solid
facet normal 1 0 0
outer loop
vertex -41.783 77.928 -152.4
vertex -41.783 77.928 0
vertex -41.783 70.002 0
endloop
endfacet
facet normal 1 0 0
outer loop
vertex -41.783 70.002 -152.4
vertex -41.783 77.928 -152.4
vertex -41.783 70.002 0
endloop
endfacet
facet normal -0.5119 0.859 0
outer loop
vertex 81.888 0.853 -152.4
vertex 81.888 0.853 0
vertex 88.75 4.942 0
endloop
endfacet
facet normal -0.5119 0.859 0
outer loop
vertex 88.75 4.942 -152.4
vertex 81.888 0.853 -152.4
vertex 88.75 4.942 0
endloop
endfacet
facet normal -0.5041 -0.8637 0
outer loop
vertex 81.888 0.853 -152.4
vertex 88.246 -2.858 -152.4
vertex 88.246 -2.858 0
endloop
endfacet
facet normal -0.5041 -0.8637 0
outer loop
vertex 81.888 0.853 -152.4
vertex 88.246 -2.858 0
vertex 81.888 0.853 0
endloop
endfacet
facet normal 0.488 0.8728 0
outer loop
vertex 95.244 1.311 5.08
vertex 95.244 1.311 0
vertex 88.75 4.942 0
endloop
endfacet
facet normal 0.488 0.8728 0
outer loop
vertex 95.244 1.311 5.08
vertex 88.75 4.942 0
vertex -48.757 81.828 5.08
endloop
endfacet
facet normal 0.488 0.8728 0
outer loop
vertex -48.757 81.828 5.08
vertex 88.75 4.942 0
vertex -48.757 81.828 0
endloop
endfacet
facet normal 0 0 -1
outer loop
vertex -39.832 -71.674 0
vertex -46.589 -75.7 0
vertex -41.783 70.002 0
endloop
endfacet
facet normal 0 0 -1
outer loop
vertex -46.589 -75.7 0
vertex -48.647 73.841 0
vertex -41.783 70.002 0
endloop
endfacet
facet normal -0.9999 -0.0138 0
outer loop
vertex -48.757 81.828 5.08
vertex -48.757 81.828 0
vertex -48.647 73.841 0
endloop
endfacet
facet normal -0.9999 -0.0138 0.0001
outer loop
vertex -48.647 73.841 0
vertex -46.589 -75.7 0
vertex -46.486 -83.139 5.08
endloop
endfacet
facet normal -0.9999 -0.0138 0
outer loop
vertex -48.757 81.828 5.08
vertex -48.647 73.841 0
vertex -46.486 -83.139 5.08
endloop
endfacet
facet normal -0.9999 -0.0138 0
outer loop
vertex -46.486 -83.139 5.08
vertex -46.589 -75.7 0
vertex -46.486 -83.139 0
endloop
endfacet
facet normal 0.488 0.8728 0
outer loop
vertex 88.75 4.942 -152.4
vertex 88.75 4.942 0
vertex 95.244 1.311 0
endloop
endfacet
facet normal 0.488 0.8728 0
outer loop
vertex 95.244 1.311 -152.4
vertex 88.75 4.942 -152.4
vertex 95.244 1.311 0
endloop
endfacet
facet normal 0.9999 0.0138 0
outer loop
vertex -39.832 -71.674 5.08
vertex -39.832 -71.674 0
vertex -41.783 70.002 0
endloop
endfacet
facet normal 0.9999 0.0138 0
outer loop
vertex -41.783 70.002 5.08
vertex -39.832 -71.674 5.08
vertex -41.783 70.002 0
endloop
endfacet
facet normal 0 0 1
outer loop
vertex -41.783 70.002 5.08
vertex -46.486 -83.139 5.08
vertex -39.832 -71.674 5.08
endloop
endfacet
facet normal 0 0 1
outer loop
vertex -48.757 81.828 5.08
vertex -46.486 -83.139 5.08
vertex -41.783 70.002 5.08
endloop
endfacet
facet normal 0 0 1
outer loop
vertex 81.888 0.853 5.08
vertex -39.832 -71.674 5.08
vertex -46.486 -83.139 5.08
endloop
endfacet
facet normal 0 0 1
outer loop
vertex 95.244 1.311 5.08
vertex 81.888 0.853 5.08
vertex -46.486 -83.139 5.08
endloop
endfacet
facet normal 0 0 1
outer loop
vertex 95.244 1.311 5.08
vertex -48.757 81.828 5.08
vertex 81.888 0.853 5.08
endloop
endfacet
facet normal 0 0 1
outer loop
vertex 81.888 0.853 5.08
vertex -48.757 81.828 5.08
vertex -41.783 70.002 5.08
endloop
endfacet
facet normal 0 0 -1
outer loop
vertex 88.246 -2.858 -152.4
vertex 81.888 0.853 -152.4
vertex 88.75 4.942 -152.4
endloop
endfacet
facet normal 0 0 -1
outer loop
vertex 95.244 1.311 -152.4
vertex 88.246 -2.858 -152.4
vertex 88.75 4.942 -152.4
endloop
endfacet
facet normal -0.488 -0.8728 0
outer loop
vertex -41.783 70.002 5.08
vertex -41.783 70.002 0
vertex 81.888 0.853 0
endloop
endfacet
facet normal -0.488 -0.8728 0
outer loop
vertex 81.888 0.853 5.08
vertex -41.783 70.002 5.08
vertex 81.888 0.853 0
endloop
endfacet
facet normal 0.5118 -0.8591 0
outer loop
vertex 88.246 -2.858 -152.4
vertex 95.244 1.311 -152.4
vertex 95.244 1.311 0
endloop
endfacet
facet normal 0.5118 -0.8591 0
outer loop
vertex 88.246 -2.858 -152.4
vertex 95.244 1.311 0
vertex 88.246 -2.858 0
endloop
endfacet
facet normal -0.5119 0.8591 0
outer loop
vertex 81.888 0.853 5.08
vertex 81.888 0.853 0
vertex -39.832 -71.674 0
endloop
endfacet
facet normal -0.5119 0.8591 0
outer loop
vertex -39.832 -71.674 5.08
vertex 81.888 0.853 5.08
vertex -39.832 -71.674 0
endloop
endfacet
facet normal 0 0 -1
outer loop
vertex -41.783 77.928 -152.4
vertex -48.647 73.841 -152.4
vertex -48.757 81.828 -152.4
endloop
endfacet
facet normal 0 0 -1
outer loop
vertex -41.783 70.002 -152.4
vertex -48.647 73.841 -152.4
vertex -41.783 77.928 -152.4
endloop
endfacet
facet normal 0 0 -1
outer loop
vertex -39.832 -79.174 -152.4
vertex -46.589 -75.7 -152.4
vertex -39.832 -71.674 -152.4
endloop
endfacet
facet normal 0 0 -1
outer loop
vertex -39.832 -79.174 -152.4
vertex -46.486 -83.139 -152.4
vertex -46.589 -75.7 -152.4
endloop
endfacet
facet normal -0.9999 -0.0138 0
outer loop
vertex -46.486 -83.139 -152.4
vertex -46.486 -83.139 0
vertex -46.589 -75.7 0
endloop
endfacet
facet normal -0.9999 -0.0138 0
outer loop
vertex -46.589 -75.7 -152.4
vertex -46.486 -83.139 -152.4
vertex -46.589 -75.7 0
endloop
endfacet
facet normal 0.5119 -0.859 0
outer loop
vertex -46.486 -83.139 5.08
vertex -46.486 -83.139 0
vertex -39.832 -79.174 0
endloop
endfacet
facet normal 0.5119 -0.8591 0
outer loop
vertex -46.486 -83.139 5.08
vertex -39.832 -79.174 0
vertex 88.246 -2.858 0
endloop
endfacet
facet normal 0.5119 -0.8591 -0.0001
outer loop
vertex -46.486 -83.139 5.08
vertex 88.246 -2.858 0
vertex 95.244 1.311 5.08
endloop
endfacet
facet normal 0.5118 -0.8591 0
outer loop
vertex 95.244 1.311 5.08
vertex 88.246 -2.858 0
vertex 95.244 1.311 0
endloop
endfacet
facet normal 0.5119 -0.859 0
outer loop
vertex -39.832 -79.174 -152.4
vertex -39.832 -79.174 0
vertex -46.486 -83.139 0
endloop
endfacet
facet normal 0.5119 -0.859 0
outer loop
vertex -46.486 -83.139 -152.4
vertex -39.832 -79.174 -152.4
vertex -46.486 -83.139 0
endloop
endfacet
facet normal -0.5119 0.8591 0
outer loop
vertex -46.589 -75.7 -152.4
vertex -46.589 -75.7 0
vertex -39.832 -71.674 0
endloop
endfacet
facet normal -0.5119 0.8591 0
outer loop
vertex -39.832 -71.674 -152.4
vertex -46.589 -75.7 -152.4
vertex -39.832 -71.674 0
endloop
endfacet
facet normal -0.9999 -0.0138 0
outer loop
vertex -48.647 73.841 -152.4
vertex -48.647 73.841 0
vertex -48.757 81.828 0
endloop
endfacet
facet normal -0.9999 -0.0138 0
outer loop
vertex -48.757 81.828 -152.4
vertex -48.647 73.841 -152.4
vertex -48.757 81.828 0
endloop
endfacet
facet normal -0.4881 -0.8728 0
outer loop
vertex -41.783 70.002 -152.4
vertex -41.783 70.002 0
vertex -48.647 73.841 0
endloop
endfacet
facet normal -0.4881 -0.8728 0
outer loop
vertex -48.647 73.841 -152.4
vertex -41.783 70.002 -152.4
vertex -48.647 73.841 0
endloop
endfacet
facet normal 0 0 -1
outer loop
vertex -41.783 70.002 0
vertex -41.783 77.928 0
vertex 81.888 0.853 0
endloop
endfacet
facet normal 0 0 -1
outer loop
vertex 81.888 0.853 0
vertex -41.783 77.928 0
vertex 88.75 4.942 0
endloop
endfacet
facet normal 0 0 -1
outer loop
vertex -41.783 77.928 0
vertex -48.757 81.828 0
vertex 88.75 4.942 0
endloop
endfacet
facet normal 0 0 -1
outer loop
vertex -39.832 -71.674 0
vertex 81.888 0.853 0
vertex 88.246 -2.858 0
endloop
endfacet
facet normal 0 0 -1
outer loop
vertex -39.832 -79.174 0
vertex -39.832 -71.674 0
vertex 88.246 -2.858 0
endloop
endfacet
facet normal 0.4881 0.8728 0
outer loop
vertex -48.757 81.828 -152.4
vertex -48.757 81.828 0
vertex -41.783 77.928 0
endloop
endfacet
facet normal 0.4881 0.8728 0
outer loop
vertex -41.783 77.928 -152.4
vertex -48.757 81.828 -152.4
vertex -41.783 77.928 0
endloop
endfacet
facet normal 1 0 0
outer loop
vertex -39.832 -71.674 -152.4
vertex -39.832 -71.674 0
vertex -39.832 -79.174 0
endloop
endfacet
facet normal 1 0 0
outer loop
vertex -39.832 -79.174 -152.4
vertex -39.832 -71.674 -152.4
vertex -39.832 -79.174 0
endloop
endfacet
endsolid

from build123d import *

# Parameters (mm, degrees)
F1_DEPTH = 5.08
F3_DEPTH = 152.4


with BuildPart() as f1:
    # F0 (on Top) → F1 (new body)
    with BuildSketch(Plane.XY):
        Polygon((95.243512, 1.311164), (-48.757257, 81.827719), (-46.486255, -83.138883), align=None)
        Polygon((-41.782549, 70.00239), (81.887859, 0.853349), (-39.832171, -71.673846), align=None, mode=Mode.SUBTRACT)
    extrude(amount=F1_DEPTH)

    # F2 (on face) → F3 (join)
    with BuildSketch(Plane(origin=(0, 0, 0), x_dir=(1, 0, 0), z_dir=(0, 0, -1))):
        Polygon((-41.782549, -77.927882), (-41.782549, -70.00239), (-48.647305, -73.840749), (-48.757257, -81.827719), align=None)
        Polygon((88.245812, 2.858434), (81.887859, -0.853349), (88.749803, -4.942055), (95.243512, -1.311164), align=None)
        Polygon((-46.588666, 75.69972), (-39.832171, 71.673846), (-39.832171, 79.17403), (-46.486255, 83.138883), align=None)
    extrude(amount=F3_DEPTH)


solid = f1.part
